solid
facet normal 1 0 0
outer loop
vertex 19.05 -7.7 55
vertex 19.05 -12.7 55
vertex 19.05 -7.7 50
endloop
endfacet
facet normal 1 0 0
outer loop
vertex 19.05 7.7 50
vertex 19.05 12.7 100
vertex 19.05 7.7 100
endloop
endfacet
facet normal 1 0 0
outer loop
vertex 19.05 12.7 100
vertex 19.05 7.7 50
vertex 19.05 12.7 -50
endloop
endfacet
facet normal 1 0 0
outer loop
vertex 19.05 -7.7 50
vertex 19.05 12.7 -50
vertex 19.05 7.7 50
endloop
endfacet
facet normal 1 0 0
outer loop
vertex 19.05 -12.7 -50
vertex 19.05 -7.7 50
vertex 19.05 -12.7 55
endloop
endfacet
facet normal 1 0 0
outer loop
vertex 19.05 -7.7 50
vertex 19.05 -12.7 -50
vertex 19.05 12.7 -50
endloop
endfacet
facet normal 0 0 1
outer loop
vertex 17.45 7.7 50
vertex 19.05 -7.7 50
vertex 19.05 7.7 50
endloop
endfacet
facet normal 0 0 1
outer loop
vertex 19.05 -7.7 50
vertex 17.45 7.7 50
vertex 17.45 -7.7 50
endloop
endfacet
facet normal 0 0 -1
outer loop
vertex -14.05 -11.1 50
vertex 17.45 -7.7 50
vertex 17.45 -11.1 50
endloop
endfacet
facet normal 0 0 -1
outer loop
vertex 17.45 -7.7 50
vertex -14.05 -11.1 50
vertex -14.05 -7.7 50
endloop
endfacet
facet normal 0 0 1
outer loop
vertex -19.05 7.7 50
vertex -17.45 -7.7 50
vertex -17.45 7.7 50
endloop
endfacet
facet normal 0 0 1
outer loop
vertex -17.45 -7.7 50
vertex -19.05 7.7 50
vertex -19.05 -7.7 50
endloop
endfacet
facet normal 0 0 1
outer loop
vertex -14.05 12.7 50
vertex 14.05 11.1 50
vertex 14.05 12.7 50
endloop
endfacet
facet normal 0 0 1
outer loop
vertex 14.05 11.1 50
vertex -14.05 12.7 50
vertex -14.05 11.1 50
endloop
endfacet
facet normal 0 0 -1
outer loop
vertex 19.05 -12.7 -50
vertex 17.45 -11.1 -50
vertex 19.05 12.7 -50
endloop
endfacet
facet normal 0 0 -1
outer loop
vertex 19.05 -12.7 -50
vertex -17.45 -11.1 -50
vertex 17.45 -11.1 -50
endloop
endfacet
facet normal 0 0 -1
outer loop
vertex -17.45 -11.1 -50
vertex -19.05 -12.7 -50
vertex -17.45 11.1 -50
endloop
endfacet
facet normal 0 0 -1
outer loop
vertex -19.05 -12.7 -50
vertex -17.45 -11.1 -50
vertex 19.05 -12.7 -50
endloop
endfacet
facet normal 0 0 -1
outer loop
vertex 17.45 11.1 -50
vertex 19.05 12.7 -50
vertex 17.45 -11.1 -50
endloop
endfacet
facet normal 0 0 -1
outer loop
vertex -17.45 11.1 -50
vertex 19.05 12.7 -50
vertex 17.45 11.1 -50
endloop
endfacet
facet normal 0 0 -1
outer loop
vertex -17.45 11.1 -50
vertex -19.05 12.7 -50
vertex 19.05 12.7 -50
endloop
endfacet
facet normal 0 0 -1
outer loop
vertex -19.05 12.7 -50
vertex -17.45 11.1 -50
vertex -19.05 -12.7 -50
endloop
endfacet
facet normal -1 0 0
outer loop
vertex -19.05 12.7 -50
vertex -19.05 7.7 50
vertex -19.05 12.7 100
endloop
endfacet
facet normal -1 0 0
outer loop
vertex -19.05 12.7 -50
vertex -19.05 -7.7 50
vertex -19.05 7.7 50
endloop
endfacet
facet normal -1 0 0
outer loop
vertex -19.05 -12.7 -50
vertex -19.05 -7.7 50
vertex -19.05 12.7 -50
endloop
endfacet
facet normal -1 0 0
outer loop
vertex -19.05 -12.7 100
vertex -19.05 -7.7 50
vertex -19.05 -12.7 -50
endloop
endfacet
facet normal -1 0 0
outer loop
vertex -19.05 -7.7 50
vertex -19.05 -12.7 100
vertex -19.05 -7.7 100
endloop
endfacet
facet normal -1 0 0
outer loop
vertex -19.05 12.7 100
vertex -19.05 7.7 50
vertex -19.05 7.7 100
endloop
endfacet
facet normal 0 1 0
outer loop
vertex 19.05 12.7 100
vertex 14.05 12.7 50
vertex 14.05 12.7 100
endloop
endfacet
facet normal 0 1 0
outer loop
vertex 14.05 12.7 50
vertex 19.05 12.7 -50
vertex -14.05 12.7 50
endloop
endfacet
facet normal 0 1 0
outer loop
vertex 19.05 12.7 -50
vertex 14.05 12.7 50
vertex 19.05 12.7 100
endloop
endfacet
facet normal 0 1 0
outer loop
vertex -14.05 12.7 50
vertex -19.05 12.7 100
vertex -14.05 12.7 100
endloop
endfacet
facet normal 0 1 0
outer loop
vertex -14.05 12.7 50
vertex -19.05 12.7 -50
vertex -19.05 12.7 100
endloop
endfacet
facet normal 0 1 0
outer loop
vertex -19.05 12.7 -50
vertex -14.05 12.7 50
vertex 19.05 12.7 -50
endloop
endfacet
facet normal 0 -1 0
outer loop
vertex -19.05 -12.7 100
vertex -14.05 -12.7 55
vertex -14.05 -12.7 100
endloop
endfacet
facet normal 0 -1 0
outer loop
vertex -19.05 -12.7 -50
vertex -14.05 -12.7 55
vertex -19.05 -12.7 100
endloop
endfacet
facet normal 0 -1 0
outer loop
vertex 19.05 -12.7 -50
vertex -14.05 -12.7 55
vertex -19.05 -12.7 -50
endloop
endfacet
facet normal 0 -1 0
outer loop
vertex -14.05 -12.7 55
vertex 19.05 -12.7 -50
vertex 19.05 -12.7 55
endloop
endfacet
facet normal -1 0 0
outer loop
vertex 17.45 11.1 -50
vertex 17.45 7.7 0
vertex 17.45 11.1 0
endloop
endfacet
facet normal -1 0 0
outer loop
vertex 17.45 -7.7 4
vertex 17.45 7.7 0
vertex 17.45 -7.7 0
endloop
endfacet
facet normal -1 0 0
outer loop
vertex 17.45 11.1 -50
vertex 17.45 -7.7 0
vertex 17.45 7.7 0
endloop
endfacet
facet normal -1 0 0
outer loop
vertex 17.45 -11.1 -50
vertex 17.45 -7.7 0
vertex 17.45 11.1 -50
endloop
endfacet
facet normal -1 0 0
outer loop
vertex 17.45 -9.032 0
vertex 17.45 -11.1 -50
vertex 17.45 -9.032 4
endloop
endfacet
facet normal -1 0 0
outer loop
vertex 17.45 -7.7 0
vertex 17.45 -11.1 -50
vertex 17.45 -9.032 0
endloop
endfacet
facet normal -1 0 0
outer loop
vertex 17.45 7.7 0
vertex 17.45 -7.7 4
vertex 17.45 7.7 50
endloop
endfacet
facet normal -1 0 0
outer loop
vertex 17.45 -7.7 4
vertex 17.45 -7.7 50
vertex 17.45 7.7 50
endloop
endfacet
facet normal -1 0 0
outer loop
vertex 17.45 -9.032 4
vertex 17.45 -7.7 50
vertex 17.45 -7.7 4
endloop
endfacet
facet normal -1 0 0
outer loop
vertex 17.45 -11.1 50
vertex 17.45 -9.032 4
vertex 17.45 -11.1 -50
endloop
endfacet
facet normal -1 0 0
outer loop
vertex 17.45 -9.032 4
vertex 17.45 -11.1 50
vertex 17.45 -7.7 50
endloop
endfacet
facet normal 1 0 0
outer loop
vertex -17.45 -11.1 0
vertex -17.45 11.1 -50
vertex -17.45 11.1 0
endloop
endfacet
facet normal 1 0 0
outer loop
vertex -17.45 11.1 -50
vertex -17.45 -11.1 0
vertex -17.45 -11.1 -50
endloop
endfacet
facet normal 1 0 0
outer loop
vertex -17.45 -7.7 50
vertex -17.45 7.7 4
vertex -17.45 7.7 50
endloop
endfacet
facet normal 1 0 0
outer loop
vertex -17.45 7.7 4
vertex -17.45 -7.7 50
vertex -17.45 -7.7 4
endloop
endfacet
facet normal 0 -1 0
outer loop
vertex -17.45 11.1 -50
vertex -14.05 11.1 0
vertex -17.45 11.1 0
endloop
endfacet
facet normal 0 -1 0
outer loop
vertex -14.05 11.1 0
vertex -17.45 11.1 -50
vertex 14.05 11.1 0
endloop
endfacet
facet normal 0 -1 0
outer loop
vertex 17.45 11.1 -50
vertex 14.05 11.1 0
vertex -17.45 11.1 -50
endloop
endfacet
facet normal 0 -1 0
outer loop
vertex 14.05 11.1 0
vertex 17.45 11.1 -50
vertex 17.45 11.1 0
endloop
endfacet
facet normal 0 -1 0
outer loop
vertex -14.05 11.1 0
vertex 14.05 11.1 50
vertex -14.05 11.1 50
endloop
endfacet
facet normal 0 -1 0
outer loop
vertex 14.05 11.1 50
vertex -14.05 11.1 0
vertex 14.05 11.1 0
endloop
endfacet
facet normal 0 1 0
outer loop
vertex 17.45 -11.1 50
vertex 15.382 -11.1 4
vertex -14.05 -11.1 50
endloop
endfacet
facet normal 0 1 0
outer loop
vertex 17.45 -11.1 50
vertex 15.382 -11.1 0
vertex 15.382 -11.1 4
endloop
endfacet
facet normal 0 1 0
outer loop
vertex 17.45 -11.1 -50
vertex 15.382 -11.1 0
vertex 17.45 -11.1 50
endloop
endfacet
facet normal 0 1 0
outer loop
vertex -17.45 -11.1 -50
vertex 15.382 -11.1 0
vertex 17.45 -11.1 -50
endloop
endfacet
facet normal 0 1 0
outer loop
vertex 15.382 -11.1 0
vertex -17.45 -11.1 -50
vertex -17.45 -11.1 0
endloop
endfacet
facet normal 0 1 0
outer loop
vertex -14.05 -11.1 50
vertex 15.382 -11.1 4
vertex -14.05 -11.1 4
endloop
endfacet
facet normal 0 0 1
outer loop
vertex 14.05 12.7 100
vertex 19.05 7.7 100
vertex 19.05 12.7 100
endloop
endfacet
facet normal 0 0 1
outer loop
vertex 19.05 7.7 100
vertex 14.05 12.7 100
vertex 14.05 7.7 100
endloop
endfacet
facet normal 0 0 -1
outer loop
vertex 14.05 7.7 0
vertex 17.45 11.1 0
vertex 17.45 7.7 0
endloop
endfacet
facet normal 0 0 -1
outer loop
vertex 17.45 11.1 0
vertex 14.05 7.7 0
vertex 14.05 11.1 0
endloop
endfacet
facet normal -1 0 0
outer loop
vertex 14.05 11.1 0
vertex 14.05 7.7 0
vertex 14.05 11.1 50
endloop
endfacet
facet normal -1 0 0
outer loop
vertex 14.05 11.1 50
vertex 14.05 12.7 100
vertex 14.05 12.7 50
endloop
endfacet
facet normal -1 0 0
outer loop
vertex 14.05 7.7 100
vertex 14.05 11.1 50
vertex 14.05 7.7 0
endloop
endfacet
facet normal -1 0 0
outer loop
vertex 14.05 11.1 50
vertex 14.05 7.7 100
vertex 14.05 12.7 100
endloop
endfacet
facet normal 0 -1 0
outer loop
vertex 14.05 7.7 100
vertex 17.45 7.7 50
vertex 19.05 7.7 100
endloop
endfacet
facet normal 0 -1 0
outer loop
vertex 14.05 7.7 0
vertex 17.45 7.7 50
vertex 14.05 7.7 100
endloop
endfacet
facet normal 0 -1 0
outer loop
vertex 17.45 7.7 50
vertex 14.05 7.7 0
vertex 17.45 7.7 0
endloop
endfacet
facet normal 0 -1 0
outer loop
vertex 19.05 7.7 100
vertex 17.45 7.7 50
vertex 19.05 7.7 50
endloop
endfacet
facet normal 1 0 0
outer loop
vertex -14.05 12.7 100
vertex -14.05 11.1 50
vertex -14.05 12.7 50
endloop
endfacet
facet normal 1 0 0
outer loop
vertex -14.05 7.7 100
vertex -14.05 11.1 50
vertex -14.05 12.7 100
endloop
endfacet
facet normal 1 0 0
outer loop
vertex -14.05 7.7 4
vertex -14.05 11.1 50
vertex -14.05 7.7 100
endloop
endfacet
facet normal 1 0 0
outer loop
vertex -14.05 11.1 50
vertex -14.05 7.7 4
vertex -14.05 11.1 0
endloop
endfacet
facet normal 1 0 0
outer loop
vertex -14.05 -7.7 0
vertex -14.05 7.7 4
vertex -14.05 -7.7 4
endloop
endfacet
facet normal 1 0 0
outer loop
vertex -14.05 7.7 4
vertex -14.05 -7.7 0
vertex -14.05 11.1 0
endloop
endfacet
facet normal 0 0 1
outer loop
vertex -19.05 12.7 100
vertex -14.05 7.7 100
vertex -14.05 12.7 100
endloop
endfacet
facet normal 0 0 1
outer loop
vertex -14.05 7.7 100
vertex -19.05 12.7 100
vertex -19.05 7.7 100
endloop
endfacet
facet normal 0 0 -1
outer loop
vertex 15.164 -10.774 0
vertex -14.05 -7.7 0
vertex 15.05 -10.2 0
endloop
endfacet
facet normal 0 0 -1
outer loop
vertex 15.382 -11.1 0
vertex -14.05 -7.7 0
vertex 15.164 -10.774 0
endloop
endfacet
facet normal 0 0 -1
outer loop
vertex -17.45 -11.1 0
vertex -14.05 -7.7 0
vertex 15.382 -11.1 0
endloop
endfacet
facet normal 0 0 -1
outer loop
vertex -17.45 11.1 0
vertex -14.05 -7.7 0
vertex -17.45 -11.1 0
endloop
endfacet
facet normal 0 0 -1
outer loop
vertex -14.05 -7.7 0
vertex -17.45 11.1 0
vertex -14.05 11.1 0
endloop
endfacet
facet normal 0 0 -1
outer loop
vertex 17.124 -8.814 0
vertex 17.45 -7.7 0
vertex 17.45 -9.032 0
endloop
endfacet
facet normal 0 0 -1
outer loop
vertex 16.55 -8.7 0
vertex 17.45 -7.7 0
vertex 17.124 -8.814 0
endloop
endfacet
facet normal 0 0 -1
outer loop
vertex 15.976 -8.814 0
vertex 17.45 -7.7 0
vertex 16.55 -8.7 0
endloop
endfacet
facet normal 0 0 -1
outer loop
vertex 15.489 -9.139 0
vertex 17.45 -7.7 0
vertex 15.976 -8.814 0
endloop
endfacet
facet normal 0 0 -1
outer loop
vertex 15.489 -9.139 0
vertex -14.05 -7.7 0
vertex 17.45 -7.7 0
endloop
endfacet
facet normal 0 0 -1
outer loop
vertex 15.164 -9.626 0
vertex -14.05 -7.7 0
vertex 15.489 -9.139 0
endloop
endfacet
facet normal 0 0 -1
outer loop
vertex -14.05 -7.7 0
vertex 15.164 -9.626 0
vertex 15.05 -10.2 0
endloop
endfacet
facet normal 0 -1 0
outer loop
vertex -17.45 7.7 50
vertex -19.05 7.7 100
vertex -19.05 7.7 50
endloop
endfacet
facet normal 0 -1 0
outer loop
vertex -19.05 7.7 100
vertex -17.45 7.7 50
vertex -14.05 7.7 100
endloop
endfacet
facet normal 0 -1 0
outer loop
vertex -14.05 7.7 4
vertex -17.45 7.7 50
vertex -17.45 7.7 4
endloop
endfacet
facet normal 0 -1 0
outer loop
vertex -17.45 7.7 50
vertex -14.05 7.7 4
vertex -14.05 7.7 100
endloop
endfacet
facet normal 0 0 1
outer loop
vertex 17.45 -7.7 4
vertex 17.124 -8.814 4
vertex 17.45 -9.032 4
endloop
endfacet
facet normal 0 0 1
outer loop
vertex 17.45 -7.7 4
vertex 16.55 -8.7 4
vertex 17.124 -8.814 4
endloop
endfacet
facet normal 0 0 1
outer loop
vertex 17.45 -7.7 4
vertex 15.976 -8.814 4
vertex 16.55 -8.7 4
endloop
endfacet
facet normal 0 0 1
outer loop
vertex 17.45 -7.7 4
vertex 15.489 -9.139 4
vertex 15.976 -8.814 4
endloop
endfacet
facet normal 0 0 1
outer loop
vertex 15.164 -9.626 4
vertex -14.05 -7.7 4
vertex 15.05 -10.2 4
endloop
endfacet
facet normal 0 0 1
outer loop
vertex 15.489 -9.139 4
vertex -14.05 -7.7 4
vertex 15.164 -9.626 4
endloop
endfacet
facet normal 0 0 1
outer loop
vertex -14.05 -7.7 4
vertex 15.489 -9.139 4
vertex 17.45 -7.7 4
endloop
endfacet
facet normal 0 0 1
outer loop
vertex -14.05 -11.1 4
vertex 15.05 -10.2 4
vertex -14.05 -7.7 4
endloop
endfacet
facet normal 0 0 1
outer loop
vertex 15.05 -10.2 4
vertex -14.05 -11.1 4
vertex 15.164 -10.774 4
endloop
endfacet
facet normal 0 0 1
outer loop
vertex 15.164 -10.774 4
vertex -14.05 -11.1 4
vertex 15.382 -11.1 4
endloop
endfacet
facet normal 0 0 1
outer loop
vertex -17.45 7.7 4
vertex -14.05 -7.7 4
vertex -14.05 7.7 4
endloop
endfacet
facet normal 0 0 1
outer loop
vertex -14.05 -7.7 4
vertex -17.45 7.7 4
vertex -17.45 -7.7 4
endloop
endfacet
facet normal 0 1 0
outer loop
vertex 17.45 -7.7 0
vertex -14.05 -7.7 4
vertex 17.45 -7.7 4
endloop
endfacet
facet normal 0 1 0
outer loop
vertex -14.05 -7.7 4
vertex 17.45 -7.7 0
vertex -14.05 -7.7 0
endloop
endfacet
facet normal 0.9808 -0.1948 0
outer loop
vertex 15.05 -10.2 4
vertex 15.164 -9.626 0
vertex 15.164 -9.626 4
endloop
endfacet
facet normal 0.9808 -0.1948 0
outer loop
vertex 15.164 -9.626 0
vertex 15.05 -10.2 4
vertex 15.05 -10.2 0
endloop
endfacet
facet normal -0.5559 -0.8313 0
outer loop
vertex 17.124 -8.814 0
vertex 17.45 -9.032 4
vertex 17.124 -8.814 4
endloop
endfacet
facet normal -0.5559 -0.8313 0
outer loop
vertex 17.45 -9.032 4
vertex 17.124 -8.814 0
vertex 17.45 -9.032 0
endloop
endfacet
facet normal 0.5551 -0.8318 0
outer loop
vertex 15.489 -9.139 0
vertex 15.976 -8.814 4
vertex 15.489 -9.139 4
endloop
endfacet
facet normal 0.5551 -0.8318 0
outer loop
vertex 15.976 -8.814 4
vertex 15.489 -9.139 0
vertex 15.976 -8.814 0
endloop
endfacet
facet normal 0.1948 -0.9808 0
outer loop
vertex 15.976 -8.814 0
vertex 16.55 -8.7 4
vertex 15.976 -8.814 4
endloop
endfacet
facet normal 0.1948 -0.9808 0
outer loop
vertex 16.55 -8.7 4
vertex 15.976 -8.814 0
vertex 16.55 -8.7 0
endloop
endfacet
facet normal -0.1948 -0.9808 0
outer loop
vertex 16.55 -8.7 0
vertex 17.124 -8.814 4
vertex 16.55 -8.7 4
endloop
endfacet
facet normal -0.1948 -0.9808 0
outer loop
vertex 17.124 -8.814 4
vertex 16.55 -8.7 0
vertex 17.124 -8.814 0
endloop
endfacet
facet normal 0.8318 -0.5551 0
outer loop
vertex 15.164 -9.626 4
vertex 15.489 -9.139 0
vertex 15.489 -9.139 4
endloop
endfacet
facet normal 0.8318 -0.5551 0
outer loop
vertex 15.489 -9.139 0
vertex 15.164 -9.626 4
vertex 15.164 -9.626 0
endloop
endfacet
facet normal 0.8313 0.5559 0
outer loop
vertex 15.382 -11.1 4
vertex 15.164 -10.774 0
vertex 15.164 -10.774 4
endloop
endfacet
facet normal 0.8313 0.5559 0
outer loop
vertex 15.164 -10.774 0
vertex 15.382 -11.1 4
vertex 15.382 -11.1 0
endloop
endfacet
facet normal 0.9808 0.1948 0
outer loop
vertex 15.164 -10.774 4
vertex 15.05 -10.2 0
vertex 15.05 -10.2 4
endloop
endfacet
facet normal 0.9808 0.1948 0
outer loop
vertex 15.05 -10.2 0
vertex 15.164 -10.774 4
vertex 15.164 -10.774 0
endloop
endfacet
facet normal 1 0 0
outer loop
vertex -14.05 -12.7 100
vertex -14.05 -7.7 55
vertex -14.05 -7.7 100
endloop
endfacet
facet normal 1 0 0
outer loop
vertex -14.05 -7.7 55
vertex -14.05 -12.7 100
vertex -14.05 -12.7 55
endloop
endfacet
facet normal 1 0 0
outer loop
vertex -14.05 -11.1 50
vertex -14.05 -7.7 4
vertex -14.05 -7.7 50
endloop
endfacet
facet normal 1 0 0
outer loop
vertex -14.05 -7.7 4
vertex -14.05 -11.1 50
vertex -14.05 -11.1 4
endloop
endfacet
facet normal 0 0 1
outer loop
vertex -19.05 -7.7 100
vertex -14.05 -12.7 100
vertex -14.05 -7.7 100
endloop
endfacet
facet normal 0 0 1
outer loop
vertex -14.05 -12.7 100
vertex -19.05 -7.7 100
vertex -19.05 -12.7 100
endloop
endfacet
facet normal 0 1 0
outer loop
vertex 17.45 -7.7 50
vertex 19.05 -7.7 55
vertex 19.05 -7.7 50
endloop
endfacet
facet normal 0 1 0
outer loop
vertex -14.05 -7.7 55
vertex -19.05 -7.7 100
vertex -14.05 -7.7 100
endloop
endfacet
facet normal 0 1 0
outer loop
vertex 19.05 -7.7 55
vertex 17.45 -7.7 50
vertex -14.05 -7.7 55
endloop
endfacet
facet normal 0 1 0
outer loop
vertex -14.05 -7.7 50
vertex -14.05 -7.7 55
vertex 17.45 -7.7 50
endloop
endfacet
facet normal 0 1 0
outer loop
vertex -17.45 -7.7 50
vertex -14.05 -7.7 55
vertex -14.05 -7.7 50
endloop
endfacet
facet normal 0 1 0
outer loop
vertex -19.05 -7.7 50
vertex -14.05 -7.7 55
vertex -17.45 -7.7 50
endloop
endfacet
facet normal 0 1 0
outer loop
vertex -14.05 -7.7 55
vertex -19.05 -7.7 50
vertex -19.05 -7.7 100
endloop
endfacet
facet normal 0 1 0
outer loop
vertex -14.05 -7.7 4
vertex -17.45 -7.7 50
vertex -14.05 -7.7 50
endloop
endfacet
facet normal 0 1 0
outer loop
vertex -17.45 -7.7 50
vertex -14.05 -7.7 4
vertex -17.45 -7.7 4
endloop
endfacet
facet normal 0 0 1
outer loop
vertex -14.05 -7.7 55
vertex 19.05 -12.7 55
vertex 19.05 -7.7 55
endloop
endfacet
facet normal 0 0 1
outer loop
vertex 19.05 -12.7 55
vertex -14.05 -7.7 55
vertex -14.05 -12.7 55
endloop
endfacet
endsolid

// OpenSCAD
// Parameters
outer_width_mm = 38.1; //[19.05:76.2:0.1]
outer_height_mm = 25.4; //[12.7:50.8:0.1]
wall_thickness_mm = 1.6; //[0.8:3.2:0.1]
length_mm = 100; //[50:200:1]
overlap_mm = 1; //[0.5:2:0.1]

// Box Section - complete geometry
module box_section() {
  color("Silver") {
    difference() {
      // Outer box
      cube([outer_width_mm, outer_height_mm, length_mm], center=true);
      // Inner void
      translate([0, 0, 0])
        cube([outer_width_mm - 2*wall_thickness_mm, 
              outer_height_mm - 2*wall_thickness_mm, 
              length_mm + 2*overlap_mm], center=true);
    }
  }
}

// Box Corner Profile Section - placeholder geometry
module box_corner_profile_section() {
  color("DimGray") {
    // Example corner profile
    translate([-outer_width_mm/2, -outer_height_mm/2, 0])
      cube([5, 5, length_mm], center=false);
  }
}

// Box Bezel Section - placeholder geometry
module box_bezel_section() {
  color("Black") {
    // Example bezel
    translate([-outer_width_mm/2, -outer_height_mm/2, length_mm/2])
      cube([outer_width_mm, 5, 5], center=false);
  }
}

// Box Corner Profile Sections - placeholder geometry
module box_corner_profile_sections() {
  color("DimGray") {
    // Example corner profiles
    translate([outer_width_mm/2 - 5, outer_height_mm/2 - 5, 0])
      cube([5, 5, length_mm], center=false);
    translate([-outer_width_mm/2, outer_height_mm/2 - 5, 0])
      cube([5, 5, length_mm], center=false);
  }
}

// Box Shelf Bracket Section - complete geometry
module box_shelf_bracket_section() {
  color("Silver") {
    // L-shaped bracket
    difference() {
      union() {
        // Vertical plate
        translate([-outer_width_mm/2, -outer_height_mm/2, 0])
          cube([5, outer_height_mm, 4], center=false);
        // Horizontal plate
        translate([-outer_width_mm/2, -outer_height_mm/2, 0])
          cube([outer_width_mm, 5, 4], center=false);
      }
      // Mounting holes
      translate([-outer_width_mm/2 + 2.5, -outer_height_mm/2 + 2.5, 2])
        cylinder(r=1.5, h=5, center=true, $fn=16);
      translate([outer_width_mm/2 - 2.5, -outer_height_mm/2 + 2.5, 2])
        cylinder(r=1.5, h=5, center=true, $fn=16);
    }
  }
}

// Assembly
module assembly() {
  box_section();
  box_corner_profile_section();
  box_bezel_section();
  box_corner_profile_sections();
  box_shelf_bracket_section();
}

assembly();
